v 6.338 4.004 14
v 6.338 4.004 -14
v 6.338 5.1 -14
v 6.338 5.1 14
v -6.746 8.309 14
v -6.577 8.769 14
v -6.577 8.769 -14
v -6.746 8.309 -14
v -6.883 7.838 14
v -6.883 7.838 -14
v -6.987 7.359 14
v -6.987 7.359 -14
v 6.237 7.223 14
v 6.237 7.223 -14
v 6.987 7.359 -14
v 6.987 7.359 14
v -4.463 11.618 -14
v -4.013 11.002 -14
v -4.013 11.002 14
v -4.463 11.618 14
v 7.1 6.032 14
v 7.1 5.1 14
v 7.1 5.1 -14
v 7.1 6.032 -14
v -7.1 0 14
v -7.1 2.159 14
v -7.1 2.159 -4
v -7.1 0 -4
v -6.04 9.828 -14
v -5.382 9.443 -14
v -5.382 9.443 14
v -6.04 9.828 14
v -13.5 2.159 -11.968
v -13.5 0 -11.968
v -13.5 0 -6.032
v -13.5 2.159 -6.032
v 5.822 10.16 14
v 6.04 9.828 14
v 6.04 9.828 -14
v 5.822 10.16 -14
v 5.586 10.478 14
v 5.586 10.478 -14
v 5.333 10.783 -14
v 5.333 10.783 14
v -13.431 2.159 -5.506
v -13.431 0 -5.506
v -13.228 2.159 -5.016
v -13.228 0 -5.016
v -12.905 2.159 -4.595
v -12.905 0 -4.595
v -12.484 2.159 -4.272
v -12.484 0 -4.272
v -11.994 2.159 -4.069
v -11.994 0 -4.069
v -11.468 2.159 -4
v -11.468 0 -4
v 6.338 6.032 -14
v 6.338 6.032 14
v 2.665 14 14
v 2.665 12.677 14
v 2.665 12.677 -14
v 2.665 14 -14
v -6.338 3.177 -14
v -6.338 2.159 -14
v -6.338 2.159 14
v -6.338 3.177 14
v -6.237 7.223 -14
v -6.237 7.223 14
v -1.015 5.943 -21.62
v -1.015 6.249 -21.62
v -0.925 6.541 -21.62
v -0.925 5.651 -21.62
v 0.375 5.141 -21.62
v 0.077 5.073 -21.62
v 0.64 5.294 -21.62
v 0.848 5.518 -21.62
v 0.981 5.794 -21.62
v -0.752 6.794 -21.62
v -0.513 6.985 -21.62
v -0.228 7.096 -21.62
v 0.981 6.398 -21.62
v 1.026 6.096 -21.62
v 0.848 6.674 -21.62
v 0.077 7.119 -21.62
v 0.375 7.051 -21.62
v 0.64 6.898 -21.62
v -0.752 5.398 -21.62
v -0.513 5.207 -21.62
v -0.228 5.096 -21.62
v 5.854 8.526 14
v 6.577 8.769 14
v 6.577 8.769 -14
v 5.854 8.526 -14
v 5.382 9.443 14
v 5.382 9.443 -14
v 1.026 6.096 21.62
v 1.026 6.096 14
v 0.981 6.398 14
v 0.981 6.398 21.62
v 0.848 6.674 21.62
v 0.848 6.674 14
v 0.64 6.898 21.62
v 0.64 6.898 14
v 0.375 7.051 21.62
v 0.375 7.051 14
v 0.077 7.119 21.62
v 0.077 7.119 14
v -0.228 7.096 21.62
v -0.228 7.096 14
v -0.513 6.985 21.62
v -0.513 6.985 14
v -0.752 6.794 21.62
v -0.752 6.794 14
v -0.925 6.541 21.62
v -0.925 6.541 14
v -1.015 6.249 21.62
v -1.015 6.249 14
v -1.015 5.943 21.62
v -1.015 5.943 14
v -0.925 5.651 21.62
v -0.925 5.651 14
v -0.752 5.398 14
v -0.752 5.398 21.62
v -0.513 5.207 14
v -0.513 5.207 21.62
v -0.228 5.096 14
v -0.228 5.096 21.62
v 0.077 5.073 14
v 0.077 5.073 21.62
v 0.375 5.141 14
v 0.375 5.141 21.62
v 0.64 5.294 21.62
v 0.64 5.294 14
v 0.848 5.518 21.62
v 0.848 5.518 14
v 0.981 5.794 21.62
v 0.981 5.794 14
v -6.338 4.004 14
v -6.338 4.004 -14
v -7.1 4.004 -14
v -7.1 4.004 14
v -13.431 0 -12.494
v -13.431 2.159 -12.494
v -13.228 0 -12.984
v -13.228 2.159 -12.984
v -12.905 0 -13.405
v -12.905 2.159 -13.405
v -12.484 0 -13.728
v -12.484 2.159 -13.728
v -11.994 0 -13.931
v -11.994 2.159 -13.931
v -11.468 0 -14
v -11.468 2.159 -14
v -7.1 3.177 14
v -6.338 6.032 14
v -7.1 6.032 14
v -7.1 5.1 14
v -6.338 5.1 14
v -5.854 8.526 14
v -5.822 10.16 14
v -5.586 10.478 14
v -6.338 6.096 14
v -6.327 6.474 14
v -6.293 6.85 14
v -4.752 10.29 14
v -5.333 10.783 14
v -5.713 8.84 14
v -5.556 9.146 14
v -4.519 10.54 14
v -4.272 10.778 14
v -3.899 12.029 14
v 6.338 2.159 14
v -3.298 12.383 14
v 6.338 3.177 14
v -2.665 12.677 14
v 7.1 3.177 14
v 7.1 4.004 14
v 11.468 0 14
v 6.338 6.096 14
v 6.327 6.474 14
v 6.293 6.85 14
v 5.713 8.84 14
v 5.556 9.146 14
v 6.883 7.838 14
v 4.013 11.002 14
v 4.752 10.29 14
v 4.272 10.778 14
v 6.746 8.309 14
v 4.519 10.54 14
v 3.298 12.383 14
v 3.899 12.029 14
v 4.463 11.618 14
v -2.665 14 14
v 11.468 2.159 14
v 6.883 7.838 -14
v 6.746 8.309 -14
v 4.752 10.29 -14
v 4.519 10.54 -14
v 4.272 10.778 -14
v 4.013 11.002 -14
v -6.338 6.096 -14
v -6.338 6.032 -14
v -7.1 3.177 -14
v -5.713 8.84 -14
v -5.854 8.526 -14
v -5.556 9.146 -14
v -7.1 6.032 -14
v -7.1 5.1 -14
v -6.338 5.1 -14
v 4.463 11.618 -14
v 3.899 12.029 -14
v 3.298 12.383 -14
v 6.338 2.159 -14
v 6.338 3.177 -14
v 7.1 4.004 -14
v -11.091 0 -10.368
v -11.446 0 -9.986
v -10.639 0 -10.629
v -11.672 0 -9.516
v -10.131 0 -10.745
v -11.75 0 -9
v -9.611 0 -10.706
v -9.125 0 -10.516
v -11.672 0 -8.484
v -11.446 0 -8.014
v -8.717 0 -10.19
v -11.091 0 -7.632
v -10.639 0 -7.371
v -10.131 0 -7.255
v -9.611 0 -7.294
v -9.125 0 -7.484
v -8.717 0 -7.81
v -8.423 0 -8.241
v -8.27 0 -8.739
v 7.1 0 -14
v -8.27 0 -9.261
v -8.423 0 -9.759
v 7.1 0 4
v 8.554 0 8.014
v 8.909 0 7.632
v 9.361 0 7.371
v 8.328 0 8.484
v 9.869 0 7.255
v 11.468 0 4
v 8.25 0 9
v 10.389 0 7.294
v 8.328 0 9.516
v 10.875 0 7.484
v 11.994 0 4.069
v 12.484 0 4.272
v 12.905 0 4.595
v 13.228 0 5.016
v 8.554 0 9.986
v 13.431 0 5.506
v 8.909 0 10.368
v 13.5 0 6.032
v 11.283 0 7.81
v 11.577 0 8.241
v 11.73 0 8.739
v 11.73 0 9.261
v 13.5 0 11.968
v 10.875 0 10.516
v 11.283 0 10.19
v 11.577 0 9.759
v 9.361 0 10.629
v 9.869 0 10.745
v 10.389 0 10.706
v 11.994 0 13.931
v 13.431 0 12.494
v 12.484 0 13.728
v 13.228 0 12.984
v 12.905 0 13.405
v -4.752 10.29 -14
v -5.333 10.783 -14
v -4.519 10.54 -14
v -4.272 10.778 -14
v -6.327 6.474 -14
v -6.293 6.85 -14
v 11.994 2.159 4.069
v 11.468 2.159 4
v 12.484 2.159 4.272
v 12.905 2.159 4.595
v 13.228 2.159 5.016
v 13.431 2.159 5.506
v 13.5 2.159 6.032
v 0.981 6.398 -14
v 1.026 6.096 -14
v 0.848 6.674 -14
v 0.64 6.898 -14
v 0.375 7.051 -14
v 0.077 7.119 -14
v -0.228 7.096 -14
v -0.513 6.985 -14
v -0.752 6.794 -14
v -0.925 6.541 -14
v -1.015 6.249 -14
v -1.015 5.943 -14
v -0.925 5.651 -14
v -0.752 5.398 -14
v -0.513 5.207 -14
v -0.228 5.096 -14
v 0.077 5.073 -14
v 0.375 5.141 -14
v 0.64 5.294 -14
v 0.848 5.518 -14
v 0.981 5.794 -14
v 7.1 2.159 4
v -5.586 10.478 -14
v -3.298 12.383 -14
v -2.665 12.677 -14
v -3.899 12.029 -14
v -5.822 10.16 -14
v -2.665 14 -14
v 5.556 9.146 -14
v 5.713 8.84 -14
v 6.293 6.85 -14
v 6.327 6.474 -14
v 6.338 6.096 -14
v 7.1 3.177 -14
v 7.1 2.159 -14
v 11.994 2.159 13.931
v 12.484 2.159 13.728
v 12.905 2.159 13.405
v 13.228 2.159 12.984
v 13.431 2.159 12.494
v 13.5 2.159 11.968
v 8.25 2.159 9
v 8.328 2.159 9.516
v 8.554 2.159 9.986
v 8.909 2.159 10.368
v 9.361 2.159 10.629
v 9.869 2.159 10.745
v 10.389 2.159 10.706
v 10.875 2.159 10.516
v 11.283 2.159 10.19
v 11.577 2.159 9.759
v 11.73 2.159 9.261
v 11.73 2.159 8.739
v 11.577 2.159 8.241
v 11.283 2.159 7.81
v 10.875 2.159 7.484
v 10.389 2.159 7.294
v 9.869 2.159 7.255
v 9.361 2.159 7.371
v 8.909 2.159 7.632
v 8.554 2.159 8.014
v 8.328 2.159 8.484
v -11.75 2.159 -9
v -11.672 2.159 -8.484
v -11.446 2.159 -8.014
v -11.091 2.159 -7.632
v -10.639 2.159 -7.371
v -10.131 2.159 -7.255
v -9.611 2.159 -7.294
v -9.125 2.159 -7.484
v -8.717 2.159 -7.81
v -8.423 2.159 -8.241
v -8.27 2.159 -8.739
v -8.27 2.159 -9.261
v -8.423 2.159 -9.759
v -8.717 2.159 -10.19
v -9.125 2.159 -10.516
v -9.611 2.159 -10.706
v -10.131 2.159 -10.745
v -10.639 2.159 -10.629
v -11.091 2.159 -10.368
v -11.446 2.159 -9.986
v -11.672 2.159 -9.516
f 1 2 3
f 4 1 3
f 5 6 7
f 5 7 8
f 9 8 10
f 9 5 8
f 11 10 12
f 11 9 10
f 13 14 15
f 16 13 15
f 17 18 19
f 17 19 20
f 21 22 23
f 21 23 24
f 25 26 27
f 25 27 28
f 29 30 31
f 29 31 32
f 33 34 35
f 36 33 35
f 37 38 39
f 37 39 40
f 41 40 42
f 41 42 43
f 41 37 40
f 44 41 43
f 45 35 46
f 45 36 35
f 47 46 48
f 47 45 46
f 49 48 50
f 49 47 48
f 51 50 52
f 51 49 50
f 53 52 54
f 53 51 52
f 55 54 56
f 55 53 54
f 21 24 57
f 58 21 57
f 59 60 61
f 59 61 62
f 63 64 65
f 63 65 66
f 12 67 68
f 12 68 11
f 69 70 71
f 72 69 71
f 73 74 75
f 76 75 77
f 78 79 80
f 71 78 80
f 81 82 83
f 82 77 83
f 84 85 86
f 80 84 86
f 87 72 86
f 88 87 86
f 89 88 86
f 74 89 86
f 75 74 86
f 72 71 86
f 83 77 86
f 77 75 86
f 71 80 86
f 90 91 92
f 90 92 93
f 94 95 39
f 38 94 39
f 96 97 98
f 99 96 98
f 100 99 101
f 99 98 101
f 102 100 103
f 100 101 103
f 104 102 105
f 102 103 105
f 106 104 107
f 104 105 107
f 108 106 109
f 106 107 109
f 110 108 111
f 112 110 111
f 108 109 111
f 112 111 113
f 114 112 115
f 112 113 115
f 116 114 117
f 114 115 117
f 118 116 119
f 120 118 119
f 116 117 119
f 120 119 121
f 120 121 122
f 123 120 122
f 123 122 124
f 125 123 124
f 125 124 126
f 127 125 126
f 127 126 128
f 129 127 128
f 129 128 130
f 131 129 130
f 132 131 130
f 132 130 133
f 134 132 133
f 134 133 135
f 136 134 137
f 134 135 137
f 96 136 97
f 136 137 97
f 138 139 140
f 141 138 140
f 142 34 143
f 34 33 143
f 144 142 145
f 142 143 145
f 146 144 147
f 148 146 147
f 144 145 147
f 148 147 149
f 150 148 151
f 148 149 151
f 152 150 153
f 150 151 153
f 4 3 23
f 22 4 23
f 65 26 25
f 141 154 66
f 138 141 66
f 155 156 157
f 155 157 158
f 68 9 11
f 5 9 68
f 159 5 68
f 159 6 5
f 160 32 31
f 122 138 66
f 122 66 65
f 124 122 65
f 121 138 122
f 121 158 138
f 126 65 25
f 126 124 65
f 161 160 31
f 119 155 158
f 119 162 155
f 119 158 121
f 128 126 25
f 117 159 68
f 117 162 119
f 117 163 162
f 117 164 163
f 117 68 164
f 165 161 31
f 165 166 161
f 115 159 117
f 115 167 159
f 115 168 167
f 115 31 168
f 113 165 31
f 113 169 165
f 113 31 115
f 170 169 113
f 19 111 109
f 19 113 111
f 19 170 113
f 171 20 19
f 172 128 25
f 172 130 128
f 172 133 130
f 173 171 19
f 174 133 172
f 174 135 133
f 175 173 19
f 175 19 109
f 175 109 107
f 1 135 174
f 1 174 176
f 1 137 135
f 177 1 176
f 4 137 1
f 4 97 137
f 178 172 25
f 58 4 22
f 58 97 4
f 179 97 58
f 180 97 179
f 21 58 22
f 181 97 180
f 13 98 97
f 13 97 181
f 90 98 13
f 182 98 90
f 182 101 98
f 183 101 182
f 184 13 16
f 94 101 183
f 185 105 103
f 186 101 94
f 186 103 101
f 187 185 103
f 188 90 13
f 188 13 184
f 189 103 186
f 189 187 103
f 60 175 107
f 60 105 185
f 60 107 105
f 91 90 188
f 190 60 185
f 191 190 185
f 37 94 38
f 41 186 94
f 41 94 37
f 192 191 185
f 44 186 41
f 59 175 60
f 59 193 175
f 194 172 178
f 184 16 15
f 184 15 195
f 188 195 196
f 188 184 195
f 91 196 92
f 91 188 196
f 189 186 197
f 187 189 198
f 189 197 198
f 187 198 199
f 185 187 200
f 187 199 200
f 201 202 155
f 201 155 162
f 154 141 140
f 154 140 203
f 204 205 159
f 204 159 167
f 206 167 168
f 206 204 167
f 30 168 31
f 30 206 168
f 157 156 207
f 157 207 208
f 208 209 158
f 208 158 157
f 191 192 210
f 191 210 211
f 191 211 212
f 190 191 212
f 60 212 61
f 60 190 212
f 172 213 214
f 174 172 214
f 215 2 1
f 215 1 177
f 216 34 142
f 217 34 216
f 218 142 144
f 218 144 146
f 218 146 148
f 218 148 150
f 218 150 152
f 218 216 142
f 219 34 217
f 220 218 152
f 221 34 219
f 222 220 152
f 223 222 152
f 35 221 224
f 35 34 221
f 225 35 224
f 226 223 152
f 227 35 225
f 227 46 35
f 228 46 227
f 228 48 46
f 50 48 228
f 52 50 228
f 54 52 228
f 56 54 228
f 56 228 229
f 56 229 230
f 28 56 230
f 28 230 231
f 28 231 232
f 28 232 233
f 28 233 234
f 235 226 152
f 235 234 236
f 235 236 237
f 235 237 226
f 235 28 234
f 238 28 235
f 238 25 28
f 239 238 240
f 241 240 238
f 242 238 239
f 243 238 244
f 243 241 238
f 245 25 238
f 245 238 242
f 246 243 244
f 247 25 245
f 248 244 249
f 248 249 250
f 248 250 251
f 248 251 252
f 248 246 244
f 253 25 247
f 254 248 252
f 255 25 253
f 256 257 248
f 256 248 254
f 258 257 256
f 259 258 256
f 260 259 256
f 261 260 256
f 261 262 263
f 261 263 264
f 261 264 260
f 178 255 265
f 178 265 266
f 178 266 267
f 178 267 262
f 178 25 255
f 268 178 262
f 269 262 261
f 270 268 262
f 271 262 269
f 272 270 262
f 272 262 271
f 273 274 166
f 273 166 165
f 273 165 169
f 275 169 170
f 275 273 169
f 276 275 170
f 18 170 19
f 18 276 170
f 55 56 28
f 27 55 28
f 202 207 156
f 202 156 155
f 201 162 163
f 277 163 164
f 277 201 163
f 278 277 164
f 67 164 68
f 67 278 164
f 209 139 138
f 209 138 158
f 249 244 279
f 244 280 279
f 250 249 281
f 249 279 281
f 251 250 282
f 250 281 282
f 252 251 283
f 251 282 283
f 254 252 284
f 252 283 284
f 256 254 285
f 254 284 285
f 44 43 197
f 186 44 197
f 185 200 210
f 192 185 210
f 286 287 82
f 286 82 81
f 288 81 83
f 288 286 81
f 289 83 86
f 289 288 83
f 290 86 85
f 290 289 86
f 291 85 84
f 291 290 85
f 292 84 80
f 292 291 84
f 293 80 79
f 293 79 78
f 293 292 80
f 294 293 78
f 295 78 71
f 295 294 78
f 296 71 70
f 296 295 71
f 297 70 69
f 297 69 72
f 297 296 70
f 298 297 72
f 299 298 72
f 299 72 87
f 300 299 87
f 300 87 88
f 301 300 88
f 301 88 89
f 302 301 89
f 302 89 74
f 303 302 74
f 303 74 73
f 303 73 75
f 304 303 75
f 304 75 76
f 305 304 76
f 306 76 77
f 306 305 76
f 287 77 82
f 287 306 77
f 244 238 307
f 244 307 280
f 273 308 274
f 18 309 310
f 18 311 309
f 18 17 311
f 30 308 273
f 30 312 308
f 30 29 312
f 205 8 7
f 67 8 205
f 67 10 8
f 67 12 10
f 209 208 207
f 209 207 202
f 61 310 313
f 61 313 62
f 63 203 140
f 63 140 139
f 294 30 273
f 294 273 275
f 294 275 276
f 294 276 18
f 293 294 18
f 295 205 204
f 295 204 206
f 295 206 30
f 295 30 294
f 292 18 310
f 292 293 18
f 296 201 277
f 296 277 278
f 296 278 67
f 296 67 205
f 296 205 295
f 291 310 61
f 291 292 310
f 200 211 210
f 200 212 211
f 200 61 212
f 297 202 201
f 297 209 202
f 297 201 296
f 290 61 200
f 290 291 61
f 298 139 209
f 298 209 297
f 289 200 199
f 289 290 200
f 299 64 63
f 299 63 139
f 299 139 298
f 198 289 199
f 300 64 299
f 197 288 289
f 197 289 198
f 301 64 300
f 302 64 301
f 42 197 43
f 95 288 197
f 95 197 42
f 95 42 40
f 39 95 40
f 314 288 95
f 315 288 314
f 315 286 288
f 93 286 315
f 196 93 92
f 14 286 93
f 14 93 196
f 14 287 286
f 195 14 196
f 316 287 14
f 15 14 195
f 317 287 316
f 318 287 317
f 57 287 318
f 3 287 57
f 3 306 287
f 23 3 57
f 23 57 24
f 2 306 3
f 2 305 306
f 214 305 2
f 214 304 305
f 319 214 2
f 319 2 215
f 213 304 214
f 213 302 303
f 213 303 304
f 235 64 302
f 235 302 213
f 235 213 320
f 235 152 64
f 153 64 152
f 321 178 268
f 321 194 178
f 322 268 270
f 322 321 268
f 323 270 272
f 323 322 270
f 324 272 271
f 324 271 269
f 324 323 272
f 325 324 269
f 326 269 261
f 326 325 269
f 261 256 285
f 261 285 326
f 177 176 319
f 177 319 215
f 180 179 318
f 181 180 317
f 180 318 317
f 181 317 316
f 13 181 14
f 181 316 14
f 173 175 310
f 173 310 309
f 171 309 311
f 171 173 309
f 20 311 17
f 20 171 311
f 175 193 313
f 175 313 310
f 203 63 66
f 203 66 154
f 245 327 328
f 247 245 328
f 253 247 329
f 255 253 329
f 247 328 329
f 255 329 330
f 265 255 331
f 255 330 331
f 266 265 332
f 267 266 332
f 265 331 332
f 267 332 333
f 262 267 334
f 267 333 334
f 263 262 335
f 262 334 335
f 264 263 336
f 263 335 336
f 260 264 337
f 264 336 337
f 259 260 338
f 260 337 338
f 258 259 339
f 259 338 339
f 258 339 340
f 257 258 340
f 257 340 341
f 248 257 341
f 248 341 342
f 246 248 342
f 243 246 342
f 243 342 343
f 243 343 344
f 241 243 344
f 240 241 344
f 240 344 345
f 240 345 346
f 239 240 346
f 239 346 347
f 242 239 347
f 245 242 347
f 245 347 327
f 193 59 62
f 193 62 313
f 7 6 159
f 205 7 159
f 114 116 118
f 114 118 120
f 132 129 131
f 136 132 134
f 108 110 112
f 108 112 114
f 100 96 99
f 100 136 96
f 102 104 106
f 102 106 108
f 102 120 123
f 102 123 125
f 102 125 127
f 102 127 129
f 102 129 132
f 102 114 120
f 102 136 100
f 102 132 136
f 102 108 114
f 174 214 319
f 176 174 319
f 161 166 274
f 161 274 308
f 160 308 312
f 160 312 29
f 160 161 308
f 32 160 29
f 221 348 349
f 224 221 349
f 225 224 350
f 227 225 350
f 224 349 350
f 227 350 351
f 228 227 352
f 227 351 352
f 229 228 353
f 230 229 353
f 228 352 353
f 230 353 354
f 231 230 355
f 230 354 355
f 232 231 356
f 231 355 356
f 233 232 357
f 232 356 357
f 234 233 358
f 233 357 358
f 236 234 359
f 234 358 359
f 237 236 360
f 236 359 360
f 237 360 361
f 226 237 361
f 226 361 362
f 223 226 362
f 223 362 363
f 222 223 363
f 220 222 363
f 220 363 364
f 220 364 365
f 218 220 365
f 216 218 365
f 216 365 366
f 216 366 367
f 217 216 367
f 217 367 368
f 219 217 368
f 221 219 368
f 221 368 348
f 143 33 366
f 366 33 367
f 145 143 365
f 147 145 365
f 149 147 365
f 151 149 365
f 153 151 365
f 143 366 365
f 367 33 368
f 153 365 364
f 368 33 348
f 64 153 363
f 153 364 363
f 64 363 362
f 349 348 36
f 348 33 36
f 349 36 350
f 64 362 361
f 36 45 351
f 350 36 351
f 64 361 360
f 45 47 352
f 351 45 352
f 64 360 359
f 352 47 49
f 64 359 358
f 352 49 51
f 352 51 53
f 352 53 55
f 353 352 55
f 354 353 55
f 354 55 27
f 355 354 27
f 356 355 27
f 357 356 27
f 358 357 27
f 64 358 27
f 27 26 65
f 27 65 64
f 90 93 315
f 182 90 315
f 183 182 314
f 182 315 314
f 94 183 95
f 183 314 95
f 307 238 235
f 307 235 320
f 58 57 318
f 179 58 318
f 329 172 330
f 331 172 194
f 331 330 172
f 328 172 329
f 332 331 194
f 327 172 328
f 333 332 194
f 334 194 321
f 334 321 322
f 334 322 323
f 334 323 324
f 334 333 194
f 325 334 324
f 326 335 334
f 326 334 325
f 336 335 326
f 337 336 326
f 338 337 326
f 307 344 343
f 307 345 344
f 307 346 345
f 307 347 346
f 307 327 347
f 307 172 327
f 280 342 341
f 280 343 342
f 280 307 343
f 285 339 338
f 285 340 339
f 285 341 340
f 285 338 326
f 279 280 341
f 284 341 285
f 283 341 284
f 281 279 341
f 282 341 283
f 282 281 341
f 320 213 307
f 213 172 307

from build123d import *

# Parameters (mm, degrees)
EXTRUDE1_DEPTH     = 14
SKETCH4_W          = 6.4
SKETCH4_H          = 10
EXTRUDE8_DEPTH     = 2.159
FILLET1_R          = 2.032
CUT_EXTRUDE1_START = -28
SKETCH3_W          = 0.762
SKETCH3_H          = 1.095986398
SKETCH3_H_2        = 1.017694432
CUT_EXTRUDE1_DEPTH = 28
SKETCH5_R          = 1.75
CUT_EXTRUDE2_DEPTH = 3.159
SKETCH6_R          = 1.02616
EXTRUDE9_DEPTH     = 7.62


with BuildPart() as part:
    # Sketch2 → Extrude1 (new body, symmetric)
    with BuildSketch(Plane.XY):
        with BuildLine():
            Line((-7.1, 0), (7.1, 0))
            Line((7.1, 0), (7.1, 6.096))
            ThreePointArc((7.1, 6.096), (5.887891848, 10.063710875), (2.665428286, 12.676690849))
            Line((2.665428286, 12.676690849), (2.665428286, 14))
            Line((2.665428286, 14), (-2.665428286, 14))
            Line((-2.665428286, 14), (-2.665428286, 12.676690849))
            ThreePointArc((-2.665428286, 12.676690849), (-5.887891848, 10.063710875), (-7.1, 6.096))
            Line((-7.1, 6.096), (-7.1, 0))
        make_face()
    extrude(amount=EXTRUDE1_DEPTH, both=True)

    # Sketch4 → Extrude8 (add)
    with BuildSketch(Plane.XZ):
        with Locations((-10.3, -9)):
            Rectangle(SKETCH4_W, SKETCH4_H)
        with Locations((10.3, 9)):
            Rectangle(SKETCH4_W, SKETCH4_H)
    extrude(amount=-EXTRUDE8_DEPTH)

    # Fillet1
    fillet1_edges = [part.edges().sort_by_distance(p)[0] for p in [
        (-13.5, 1.0795, -14),
        (-13.5, 1.0795, -4),
        (13.5, 1.0795, 14),
        (13.5, 1.0795, 4),
    ]]
    fillet(fillet1_edges, radius=FILLET1_R)

    # Sketch3 → Cut-Extrude1 (cut)
    with BuildSketch(Plane.XY.offset(14).offset(CUT_EXTRUDE1_START)):
        with Locations((6.719, 4.552283628)):
            Rectangle(SKETCH3_W, SKETCH3_H)
        with BuildLine():
            Line((6.236968685, 7.223149334), (6.986821973, 7.358663344))
            ThreePointArc((6.986821973, 7.358663344), (7.071648889, 6.729862758), (7.1, 6.096))
            Line((7.1, 6.096), (7.1, 6.032119719))
            Line((7.1, 6.032119719), (6.338, 6.032119719))
            Line((6.338, 6.032119719), (6.338, 6.096))
            ThreePointArc((6.338, 6.096), (6.312691642, 6.661834107), (6.236968685, 7.223149334))
        make_face()
        with Locations((6.719, 2.667847216)):
            Rectangle(SKETCH3_W, SKETCH3_H_2)
        with BuildLine():
            Line((4.012570752, 11.002069706), (4.462775162, 11.618104477))
            ThreePointArc((4.462775162, 11.618104477), (4.915642764, 11.219129534), (5.332989208, 10.783134104))
            Line((5.332989208, 10.783134104), (4.752139233, 10.289735412))
            ThreePointArc((4.752139233, 10.289735412), (4.396804558, 10.660904564), (4.012570752, 11.002069706))
        make_face()
        with BuildLine():
            Line((5.381940738, 9.443380752), (6.039888527, 9.828257571))
            ThreePointArc((6.039888527, 9.828257571), (6.330841034, 9.310102022), (6.577443928, 8.769430636))
            Line((6.577443928, 8.769430636), (5.85354185, 8.526286364))
            ThreePointArc((5.85354185, 8.526286364), (5.636424644, 8.994441172), (5.381940738, 9.443380752))
        make_face()
    cut_extrude1 = extrude(amount=CUT_EXTRUDE1_DEPTH, mode=Mode.SUBTRACT)

    # Mirror2: Cut-Extrude1 across plane
    add(cut_extrude1.mirror(Plane(origin=(0, 0, 0), x_dir=(0, 0, 1), z_dir=(1, 0, 0))), mode=Mode.SUBTRACT)

    # Sketch5 → Cut-Extrude2 (cut, through all)
    with BuildSketch(Plane(origin=(0, 2.159, 0), x_dir=(-1, 0, 0), z_dir=(0, 1, 0))):
        with Locations((-10, 9)):
            Circle(SKETCH5_R)
        with Locations((10, -9)):
            Circle(SKETCH5_R)
    extrude(amount=-CUT_EXTRUDE2_DEPTH, mode=Mode.SUBTRACT)

    # Sketch6 → Extrude9 (add)
    with BuildSketch(Plane.XY.offset(14)):
        with Locations((0, 6.096)):
            Circle(SKETCH6_R)
    extrude9 = extrude(amount=EXTRUDE9_DEPTH)

    # Mirror3: Extrude9 across plane
    add(extrude9.mirror(Plane.XY))


solid = part.part
